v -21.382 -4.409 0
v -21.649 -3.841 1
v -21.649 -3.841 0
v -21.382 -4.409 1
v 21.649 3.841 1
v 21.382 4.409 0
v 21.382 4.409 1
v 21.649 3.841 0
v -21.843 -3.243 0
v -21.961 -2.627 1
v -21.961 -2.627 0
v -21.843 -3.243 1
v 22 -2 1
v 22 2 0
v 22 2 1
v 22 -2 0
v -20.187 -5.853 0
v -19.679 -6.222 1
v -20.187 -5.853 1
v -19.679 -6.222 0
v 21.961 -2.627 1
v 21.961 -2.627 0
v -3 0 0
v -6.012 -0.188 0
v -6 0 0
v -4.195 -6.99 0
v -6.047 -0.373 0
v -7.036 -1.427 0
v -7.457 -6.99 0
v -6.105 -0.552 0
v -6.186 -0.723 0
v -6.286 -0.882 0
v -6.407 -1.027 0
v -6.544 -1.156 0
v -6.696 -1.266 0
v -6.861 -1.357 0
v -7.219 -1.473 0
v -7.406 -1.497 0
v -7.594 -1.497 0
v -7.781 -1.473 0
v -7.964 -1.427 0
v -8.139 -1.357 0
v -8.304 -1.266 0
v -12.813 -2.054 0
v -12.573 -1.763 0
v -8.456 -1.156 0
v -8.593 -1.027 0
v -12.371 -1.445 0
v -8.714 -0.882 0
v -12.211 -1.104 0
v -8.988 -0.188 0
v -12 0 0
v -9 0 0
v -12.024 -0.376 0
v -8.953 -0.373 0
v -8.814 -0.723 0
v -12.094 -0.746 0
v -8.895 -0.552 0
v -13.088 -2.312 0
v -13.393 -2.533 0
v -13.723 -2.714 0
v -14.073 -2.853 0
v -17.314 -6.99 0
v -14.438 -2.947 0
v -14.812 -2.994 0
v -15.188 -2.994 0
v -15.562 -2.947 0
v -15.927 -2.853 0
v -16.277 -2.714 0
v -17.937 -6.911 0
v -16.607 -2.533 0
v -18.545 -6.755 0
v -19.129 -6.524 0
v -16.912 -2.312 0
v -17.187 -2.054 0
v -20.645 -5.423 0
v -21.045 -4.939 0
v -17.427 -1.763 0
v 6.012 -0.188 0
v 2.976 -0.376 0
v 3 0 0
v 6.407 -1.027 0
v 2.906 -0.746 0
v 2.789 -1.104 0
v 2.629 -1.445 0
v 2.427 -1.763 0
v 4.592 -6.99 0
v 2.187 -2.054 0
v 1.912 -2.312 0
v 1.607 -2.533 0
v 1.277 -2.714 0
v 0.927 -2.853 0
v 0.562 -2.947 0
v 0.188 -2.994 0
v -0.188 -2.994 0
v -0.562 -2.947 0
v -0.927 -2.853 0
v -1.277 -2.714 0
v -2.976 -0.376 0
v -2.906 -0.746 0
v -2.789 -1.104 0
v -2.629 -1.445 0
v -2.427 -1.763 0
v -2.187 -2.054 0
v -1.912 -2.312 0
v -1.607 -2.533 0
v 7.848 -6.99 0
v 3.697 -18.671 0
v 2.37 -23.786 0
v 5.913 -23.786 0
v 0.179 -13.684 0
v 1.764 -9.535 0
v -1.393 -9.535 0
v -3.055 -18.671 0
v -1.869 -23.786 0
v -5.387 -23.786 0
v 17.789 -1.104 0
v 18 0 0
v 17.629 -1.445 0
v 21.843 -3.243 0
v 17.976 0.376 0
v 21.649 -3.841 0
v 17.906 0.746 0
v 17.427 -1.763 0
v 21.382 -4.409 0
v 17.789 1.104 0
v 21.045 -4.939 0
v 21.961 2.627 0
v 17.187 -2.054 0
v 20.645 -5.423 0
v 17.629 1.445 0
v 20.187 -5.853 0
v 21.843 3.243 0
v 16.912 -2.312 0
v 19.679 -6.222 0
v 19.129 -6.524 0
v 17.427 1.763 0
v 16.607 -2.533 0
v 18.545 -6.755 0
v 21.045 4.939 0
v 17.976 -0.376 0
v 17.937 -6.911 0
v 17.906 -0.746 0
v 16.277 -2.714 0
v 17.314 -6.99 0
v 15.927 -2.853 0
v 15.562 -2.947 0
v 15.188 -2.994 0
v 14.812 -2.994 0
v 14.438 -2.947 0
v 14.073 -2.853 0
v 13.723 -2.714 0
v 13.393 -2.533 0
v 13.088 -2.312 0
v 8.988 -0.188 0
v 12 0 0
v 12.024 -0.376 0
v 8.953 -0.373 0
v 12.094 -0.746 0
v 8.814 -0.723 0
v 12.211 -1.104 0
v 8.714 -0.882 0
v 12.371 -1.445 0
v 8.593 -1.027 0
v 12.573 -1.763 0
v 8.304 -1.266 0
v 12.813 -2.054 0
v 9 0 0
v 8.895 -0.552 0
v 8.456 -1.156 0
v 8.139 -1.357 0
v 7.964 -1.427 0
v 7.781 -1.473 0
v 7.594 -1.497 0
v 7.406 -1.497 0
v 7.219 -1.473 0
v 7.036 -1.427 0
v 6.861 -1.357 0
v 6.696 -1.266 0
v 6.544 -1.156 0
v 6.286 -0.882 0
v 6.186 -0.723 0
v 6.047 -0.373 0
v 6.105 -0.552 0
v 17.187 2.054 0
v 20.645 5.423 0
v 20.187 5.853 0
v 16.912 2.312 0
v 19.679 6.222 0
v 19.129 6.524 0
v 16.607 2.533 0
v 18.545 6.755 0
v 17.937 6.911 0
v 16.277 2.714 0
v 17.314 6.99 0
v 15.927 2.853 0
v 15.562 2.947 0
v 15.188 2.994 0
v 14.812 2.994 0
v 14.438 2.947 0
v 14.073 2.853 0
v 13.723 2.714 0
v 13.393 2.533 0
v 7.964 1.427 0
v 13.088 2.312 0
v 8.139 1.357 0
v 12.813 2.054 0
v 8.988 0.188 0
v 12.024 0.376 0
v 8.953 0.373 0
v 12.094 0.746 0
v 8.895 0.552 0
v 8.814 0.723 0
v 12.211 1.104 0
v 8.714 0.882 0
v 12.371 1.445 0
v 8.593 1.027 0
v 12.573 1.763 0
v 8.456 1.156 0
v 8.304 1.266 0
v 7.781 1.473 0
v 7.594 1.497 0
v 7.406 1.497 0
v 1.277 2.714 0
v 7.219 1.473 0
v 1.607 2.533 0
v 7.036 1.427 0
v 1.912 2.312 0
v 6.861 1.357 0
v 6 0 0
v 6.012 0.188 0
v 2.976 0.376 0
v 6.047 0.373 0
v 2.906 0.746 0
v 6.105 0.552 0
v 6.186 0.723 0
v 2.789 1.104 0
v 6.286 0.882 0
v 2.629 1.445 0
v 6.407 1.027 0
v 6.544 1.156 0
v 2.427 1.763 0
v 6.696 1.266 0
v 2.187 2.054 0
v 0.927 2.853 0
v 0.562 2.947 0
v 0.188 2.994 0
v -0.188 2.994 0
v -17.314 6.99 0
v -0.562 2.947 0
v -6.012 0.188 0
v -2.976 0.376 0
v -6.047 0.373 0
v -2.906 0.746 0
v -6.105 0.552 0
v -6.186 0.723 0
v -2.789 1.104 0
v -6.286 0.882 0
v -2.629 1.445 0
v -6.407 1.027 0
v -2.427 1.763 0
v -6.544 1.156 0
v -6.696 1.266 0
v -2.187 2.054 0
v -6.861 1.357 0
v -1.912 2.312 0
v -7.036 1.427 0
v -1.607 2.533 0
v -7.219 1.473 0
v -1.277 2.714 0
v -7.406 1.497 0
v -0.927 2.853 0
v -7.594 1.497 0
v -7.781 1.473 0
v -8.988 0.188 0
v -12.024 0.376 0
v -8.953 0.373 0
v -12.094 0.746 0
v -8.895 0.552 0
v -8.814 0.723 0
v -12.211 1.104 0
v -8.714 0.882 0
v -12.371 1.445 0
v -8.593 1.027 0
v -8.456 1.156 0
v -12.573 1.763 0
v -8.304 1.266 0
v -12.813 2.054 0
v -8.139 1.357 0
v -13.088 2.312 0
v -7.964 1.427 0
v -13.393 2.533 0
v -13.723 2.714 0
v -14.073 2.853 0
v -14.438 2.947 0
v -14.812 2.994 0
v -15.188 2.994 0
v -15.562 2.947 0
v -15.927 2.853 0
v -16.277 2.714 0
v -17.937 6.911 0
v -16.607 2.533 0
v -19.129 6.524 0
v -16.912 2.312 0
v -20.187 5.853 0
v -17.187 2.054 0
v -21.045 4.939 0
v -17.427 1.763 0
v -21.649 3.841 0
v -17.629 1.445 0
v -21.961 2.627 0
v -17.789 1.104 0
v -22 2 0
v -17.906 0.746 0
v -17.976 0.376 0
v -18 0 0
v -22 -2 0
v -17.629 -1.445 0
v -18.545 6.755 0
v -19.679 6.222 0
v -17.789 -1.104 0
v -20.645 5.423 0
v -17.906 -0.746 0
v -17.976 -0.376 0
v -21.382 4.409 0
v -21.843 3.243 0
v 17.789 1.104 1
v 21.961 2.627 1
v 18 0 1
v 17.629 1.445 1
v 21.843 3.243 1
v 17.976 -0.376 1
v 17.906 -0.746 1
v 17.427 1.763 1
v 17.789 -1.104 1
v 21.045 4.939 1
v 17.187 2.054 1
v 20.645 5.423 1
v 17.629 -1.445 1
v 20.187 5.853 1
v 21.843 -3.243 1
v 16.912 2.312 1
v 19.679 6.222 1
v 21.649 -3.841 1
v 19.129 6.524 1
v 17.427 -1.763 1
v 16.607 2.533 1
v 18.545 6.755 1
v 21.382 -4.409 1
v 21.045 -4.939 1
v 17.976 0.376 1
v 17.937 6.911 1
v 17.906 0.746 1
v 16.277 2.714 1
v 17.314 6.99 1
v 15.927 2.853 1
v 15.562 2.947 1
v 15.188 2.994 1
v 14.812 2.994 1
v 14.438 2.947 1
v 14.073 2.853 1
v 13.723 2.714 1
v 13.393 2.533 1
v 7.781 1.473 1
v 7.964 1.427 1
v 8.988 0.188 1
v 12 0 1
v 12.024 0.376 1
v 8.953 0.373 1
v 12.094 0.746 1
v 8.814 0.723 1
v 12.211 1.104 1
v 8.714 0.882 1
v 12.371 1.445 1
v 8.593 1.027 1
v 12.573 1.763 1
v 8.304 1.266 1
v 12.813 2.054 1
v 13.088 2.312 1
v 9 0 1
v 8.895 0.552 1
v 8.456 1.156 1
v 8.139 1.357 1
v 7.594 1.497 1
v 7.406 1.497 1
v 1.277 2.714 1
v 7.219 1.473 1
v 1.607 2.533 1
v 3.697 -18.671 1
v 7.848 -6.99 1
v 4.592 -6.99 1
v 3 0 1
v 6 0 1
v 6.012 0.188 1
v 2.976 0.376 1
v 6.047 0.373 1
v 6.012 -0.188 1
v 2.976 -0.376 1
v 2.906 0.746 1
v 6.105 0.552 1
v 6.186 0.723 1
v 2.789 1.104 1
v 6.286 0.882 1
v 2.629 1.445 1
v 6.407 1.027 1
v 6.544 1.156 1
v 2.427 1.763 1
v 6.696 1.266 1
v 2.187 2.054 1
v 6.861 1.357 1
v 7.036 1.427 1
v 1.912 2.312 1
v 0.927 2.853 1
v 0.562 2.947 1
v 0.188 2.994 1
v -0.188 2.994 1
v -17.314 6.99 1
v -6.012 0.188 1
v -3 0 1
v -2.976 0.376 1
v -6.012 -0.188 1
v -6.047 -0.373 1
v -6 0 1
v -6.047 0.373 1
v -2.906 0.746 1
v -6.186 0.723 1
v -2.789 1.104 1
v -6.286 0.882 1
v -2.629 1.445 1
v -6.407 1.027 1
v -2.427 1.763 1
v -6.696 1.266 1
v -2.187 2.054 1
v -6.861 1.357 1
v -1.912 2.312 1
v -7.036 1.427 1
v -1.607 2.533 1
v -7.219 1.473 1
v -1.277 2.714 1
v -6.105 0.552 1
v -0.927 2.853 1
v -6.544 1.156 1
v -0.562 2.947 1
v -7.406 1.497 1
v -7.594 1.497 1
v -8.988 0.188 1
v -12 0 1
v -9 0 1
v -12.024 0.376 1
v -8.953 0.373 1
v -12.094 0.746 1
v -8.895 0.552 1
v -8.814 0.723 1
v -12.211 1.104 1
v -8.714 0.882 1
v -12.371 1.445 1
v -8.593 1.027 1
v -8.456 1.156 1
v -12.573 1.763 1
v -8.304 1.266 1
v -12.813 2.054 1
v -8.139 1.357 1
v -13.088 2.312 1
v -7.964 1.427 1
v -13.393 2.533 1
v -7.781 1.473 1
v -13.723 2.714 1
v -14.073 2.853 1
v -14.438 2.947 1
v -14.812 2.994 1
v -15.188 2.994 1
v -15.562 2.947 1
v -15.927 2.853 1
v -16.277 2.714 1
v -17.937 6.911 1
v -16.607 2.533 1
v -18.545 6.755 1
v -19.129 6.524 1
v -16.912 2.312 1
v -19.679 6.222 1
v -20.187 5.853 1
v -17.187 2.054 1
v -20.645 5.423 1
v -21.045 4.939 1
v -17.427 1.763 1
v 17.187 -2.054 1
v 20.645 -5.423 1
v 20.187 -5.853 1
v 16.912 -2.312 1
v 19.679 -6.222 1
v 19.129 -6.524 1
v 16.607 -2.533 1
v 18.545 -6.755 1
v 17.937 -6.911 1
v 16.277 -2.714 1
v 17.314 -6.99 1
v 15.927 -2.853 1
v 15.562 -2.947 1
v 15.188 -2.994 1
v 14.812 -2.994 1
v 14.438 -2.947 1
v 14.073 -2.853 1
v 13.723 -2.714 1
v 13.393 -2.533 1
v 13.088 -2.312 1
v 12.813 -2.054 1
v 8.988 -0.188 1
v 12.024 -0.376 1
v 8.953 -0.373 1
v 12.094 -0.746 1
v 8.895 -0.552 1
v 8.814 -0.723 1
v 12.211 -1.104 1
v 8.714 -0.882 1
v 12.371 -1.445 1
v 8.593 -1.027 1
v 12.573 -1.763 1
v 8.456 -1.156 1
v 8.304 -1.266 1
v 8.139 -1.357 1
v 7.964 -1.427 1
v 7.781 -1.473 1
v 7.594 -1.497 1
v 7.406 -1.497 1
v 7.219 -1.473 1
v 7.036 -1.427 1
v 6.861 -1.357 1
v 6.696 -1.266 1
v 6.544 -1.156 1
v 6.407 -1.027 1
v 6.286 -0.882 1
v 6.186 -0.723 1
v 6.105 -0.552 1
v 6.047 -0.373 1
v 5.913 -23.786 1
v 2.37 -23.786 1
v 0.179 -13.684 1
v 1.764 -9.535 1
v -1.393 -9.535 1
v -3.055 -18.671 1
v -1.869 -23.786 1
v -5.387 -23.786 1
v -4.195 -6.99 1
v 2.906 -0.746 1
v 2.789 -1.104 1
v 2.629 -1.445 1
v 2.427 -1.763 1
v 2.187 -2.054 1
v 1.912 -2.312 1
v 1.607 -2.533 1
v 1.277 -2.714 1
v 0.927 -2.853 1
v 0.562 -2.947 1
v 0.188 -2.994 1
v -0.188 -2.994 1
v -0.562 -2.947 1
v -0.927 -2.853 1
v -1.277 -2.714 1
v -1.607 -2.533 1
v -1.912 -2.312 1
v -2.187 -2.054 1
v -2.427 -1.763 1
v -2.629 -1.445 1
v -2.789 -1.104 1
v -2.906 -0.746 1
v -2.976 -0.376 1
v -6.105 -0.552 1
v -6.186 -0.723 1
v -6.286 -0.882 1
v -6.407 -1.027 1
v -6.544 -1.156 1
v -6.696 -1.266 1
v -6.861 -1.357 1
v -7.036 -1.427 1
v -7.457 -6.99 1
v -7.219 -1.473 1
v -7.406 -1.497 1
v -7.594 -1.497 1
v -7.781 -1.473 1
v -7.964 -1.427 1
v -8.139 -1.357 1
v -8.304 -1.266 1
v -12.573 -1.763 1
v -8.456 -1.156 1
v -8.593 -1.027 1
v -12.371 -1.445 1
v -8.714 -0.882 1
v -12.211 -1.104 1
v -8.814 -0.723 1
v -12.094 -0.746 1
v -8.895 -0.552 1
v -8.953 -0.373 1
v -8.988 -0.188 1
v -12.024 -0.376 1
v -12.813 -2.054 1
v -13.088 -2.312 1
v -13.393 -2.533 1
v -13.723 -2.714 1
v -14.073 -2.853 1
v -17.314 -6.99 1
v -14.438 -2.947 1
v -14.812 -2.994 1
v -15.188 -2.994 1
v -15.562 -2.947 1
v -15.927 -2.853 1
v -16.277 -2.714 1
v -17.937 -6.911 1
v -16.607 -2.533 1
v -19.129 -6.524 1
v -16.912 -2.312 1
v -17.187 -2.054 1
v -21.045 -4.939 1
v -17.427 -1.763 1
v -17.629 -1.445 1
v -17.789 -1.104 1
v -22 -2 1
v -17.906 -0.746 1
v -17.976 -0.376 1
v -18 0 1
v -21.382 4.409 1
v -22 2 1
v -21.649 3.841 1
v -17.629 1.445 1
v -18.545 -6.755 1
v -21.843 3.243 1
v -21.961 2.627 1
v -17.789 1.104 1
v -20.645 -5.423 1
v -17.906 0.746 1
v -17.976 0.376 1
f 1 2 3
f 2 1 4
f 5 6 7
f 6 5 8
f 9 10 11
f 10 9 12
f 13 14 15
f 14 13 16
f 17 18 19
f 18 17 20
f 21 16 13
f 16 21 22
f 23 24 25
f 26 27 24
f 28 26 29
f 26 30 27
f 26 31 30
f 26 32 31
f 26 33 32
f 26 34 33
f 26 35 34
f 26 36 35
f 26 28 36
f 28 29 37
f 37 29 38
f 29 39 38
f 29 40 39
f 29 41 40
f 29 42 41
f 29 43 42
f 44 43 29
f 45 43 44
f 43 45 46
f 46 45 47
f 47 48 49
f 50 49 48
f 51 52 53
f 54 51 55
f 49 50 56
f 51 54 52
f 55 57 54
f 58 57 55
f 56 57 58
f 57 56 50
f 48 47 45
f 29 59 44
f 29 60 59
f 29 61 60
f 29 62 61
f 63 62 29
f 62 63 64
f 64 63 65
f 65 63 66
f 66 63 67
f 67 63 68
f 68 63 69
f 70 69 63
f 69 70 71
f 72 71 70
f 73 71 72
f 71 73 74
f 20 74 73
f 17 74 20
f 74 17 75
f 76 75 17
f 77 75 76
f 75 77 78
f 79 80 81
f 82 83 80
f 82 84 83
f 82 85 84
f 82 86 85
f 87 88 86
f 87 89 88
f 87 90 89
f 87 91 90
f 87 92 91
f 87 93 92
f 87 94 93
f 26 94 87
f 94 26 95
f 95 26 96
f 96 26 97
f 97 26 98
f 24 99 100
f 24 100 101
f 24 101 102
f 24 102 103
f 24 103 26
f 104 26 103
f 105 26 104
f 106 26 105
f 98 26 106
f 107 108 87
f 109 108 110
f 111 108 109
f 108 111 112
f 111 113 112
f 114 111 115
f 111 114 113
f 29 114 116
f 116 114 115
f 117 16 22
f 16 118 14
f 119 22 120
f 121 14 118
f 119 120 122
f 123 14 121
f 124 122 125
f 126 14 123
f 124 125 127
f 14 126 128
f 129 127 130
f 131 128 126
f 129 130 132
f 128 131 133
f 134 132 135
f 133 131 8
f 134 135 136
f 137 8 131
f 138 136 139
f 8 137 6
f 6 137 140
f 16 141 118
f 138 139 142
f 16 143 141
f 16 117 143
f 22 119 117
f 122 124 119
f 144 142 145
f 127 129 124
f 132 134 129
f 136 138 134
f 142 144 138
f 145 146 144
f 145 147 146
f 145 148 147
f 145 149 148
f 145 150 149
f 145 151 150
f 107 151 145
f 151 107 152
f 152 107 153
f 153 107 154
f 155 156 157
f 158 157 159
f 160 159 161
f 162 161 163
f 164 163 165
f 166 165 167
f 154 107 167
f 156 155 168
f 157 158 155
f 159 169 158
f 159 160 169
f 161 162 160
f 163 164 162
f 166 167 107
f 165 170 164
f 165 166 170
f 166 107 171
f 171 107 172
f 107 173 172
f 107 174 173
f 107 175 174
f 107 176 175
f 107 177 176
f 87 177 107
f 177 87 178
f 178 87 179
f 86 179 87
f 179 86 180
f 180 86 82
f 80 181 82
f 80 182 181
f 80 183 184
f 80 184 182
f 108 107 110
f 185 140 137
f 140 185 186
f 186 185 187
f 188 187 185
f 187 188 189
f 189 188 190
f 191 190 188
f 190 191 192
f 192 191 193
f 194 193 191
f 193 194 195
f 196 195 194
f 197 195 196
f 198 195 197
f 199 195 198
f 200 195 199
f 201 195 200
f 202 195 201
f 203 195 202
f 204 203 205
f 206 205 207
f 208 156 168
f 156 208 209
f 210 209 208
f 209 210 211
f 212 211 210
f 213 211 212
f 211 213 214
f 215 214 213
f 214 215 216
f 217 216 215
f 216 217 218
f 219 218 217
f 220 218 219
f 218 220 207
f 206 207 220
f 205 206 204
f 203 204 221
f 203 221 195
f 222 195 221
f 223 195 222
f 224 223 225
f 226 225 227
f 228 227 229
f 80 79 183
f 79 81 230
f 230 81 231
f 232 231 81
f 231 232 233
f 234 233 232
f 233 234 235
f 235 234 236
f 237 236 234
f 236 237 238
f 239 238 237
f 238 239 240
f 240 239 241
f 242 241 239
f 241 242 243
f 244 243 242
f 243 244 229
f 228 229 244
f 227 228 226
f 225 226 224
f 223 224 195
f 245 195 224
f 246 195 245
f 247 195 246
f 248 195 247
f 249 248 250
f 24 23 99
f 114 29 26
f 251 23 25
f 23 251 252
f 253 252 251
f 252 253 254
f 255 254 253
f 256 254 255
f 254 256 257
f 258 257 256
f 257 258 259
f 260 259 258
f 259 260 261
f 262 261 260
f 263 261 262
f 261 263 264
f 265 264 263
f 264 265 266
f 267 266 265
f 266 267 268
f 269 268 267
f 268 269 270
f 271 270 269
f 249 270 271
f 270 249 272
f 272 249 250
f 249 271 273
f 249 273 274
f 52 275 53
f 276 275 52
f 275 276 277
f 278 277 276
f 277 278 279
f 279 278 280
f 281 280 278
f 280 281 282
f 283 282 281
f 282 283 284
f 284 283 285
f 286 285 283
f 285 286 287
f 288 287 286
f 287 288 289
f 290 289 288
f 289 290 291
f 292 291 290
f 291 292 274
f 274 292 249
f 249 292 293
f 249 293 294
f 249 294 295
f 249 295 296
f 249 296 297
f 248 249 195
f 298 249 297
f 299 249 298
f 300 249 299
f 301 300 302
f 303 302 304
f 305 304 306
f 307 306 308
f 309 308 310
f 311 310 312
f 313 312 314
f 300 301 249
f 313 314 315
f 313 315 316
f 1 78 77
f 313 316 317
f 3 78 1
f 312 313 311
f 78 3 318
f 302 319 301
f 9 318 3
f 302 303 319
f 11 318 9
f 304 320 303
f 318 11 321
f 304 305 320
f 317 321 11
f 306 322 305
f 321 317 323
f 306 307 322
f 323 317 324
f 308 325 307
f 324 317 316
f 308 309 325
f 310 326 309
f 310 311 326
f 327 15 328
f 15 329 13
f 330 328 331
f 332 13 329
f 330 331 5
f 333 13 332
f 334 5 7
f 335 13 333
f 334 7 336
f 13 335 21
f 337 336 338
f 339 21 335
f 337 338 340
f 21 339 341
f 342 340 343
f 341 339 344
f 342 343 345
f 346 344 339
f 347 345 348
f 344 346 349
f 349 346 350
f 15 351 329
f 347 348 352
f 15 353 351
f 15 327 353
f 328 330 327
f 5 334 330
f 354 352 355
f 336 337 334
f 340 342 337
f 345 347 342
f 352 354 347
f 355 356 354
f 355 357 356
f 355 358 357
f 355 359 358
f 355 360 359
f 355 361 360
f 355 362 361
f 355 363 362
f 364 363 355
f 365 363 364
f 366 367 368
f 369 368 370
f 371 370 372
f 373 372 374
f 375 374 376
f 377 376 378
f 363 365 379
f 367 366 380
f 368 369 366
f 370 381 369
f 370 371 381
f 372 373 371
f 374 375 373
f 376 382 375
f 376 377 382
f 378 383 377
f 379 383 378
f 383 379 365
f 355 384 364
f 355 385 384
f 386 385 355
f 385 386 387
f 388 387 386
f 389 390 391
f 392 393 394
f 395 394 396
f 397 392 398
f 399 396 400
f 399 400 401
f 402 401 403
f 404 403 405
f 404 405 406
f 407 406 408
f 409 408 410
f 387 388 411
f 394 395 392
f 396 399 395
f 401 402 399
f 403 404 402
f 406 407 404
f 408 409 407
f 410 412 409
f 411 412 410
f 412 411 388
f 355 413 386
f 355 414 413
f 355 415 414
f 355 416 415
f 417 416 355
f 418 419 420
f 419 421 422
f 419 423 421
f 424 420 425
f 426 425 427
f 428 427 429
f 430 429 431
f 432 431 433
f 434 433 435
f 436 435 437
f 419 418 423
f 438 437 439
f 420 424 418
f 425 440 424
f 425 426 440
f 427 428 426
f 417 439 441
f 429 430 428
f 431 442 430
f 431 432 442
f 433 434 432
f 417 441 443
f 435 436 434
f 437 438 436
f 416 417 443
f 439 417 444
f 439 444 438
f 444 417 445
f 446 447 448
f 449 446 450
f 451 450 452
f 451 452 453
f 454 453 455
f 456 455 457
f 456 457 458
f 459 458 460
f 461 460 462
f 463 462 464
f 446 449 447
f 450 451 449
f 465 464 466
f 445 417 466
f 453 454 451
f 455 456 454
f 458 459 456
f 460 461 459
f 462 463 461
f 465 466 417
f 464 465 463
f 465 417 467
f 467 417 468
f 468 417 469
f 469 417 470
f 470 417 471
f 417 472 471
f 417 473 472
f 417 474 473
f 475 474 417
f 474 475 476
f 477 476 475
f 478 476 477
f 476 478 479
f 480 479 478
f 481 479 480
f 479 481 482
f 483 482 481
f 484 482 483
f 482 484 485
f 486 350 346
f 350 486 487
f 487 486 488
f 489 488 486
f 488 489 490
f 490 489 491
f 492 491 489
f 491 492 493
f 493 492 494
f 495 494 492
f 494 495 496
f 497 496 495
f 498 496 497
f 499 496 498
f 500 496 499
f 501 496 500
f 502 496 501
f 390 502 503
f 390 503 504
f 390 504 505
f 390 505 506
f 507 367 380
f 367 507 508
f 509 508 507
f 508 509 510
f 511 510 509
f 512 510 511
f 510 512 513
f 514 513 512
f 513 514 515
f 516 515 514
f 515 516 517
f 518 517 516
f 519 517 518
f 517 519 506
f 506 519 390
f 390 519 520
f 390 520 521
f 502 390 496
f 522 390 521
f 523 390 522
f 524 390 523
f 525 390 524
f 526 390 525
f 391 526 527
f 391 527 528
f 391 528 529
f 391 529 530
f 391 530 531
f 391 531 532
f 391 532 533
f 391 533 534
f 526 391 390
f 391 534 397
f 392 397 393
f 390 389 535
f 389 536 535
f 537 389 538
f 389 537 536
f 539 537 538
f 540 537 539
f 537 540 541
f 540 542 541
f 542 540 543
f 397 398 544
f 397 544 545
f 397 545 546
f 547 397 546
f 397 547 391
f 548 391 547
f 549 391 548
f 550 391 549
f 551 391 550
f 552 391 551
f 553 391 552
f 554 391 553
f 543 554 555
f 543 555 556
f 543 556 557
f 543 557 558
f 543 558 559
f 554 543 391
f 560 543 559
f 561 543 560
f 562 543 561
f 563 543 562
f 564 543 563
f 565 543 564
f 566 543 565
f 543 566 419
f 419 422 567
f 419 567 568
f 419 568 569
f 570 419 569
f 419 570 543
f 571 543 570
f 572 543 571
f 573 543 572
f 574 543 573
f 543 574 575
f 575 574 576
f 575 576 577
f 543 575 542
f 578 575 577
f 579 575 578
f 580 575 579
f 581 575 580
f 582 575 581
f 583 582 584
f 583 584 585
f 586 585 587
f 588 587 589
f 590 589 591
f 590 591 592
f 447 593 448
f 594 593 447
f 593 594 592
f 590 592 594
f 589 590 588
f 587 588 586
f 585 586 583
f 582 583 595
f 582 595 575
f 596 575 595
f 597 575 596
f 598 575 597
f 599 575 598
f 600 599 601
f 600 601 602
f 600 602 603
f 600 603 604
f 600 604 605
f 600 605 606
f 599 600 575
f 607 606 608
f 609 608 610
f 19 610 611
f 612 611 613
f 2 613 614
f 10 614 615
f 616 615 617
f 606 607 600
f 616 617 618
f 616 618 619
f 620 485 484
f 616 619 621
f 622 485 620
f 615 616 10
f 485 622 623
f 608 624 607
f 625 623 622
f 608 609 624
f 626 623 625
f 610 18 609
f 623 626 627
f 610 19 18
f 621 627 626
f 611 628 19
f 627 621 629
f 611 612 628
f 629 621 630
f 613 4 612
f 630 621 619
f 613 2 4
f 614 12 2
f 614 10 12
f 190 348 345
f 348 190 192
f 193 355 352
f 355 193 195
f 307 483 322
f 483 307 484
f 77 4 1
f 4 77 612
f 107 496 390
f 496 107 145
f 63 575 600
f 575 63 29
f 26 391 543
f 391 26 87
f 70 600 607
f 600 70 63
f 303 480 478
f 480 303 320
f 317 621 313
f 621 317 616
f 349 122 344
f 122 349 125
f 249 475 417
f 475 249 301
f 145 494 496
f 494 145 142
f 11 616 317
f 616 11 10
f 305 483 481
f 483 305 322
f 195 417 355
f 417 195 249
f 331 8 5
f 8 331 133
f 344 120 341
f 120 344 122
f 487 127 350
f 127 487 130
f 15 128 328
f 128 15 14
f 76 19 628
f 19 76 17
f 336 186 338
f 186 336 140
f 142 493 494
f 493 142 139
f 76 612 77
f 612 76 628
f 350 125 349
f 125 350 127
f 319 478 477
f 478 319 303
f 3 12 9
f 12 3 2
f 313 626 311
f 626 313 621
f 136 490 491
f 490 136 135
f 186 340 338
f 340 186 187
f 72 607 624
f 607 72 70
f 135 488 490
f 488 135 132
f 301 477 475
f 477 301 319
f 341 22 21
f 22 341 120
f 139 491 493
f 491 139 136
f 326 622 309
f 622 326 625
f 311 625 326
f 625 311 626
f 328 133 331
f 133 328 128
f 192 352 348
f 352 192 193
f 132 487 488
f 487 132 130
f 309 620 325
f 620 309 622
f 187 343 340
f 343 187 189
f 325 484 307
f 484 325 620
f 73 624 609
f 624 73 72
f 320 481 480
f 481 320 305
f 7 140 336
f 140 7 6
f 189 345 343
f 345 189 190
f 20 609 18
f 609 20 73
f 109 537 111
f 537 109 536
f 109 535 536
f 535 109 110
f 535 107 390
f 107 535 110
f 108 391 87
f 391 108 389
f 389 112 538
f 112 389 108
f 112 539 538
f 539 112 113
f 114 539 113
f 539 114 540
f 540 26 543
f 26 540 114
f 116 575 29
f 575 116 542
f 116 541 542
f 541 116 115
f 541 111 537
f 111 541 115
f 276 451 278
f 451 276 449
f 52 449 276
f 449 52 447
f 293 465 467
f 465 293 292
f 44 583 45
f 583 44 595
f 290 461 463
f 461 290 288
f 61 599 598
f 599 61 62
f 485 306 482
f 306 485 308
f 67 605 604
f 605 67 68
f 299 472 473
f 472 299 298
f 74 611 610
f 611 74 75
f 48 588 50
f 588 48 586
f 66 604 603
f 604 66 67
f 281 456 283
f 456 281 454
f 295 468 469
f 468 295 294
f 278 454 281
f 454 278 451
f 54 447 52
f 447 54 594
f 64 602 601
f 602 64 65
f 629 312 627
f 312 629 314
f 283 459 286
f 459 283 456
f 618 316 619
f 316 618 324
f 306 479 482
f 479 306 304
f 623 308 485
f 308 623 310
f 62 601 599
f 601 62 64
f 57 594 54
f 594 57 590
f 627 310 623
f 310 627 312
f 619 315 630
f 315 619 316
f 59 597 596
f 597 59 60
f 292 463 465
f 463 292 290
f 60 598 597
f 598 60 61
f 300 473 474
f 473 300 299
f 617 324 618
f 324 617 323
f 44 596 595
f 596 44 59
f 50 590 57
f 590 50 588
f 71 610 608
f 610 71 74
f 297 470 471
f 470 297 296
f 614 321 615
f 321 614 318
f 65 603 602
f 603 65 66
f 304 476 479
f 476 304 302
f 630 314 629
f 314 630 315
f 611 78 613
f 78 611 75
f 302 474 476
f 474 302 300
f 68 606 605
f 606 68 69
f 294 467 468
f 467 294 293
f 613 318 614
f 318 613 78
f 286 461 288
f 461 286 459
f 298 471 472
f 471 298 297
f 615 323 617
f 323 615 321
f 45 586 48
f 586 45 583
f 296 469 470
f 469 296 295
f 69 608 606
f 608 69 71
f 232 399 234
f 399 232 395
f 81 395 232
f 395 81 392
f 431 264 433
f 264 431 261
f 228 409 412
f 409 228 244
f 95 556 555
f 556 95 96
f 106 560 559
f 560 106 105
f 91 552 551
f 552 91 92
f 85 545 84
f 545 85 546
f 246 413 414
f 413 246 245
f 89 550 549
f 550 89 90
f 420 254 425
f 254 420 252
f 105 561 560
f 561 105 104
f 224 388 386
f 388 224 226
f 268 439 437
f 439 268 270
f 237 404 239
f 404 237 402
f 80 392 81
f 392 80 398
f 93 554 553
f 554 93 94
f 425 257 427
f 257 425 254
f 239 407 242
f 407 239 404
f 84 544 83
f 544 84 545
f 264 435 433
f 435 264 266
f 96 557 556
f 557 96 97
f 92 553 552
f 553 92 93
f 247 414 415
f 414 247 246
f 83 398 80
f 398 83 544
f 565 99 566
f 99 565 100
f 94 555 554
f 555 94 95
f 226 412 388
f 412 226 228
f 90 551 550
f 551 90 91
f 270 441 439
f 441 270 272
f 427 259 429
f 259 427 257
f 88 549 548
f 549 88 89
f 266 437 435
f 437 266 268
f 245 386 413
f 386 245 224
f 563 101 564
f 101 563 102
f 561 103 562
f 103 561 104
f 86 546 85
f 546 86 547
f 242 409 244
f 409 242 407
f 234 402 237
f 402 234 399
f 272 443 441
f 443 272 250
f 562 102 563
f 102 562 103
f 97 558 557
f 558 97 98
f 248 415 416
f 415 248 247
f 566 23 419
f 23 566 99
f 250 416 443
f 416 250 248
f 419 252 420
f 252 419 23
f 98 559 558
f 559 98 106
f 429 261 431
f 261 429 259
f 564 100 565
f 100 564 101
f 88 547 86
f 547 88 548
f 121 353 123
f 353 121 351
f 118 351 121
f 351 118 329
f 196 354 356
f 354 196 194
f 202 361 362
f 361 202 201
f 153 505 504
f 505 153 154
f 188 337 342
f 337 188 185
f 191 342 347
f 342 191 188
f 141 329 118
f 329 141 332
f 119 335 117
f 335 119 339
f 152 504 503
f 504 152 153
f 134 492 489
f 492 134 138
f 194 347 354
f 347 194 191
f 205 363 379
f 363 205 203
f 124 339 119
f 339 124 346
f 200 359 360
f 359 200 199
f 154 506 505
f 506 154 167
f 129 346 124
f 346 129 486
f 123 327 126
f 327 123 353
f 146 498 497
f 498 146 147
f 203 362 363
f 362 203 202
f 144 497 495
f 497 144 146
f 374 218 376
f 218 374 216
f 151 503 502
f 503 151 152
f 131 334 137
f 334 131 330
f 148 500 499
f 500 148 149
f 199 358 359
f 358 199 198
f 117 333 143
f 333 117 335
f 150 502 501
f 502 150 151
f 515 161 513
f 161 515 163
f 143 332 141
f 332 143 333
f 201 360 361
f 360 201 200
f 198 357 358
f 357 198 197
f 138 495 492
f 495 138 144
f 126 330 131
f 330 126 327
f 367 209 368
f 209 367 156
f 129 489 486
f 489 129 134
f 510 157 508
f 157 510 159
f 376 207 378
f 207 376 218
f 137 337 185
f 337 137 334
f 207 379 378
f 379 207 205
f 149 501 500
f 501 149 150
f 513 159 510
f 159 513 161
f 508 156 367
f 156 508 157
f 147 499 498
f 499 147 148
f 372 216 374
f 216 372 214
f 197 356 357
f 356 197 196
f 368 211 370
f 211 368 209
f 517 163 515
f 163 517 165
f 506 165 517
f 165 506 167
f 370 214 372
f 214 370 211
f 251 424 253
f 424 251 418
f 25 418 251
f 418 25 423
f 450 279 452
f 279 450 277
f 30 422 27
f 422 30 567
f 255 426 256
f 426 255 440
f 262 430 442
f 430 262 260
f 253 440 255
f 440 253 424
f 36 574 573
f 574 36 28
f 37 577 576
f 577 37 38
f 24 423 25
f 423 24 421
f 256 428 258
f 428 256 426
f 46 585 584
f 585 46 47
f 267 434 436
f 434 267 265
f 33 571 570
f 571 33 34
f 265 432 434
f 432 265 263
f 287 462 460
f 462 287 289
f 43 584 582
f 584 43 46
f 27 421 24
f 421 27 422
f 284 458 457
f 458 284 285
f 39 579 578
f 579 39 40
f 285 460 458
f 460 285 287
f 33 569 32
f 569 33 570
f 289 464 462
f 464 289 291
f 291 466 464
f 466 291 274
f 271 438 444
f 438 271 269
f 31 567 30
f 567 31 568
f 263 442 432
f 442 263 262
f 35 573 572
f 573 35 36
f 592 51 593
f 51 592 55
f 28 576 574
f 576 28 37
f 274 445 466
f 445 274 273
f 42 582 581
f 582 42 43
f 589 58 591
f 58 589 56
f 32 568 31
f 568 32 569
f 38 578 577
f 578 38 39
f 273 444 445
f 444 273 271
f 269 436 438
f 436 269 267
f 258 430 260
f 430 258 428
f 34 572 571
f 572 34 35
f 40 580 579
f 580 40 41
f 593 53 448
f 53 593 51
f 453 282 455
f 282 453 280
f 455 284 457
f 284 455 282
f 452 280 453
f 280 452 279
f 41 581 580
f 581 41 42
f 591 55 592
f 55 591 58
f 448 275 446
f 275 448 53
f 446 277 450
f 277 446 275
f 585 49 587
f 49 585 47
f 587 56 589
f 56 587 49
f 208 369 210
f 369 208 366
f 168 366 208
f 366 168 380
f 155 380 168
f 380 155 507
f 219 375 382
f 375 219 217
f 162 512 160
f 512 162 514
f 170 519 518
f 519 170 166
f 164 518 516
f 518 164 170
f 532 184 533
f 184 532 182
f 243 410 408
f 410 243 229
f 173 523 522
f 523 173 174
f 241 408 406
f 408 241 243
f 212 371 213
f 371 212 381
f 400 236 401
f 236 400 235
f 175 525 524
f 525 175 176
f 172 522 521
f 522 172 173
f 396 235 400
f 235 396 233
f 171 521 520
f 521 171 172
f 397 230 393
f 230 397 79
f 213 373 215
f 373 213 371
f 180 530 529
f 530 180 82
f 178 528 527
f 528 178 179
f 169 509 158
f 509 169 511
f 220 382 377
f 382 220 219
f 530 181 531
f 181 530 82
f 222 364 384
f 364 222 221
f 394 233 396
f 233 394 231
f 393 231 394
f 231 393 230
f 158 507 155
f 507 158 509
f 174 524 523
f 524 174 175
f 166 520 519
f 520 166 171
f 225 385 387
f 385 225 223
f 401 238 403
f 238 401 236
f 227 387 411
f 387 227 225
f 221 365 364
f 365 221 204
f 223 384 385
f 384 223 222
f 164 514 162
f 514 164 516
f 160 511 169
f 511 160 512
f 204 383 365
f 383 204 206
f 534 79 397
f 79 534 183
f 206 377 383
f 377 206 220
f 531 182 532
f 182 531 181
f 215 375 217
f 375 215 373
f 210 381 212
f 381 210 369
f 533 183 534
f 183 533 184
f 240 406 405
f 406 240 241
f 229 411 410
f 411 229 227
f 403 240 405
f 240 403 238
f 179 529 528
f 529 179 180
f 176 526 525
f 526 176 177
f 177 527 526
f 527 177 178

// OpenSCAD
$fn = 50;


difference() {
	union() {
		*color(alpha = 1.0000000000, c = "gray") {
			translate(v = [0, 14, 0]) {
				linear_extrude(height = 1) {
					text(font = "Arial:style=Bold", halign = "center", size = 4.5000000000, text = "COMMENT description oobb_plate_shape_p_type_1_depth_3_width_1_thickness_w_extra_oobb_size", valign = "center");
				}
			}
		}
		hull() {
			translate(v = [-17.0000000000, 2.0000000000, 0]) {
				cylinder(h = 1, r = 5);
			}
			translate(v = [17.0000000000, 2.0000000000, 0]) {
				cylinder(h = 1, r = 5);
			}
			translate(v = [-17.0000000000, -2.0000000000, 0]) {
				cylinder(h = 1, r = 5);
			}
			translate(v = [17.0000000000, -2.0000000000, 0]) {
				cylinder(h = 1, r = 5);
			}
		}
		translate(v = [0, -5, 0]) {
			linear_extrude(height = 1) {
				text(font = "DejaVu Sans Mono:style=Bold", halign = "center", size = 19.0000000000, text = "W", valign = "top");
			}
		}
	}
	union() {
		*color(alpha = 1.0000000000, c = "gray") {
			translate(v = [0, 14, 0]) {
				linear_extrude(height = 1) {
					text(font = "Arial:style=Bold", halign = "center", size = 4.5000000000, text = "COMMENT description oobb_holes_shape_n_type_3_width_1_thickness_w_extra_oobb_size_1_height_'all'_holes_true_both_holes", valign = "center");
				}
			}
		}
		translate(v = [-15.0000000000, 0.0000000000, 0]) {
			translate(v = [0, 0, -50]) {
				cylinder(h = 100, r = 3.0000000000);
			}
		}
		translate(v = [0, 0, -50]) {
			cylinder(h = 100, r = 3.0000000000);
		}
		translate(v = [15.0000000000, 0.0000000000, 0]) {
			translate(v = [0, 0, -50]) {
				cylinder(h = 100, r = 3.0000000000);
			}
		}
		translate(v = [-15.0000000000, 0.0000000000, 0]) {
			translate(v = [0, 0, -50]) {
				cylinder(h = 100, r = 1.5000000000);
			}
		}
		translate(v = [-7.5000000000, 0.0000000000, 0]) {
			translate(v = [0, 0, -50]) {
				cylinder(h = 100, r = 1.5000000000);
			}
		}
		translate(v = [0, 0, -50]) {
			cylinder(h = 100, r = 1.5000000000);
		}
		translate(v = [7.5000000000, 0.0000000000, 0]) {
			translate(v = [0, 0, -50]) {
				cylinder(h = 100, r = 1.5000000000);
			}
		}
		translate(v = [15.0000000000, 0.0000000000, 0]) {
			translate(v = [0, 0, -50]) {
				cylinder(h = 100, r = 1.5000000000);
			}
		}
	}
}
